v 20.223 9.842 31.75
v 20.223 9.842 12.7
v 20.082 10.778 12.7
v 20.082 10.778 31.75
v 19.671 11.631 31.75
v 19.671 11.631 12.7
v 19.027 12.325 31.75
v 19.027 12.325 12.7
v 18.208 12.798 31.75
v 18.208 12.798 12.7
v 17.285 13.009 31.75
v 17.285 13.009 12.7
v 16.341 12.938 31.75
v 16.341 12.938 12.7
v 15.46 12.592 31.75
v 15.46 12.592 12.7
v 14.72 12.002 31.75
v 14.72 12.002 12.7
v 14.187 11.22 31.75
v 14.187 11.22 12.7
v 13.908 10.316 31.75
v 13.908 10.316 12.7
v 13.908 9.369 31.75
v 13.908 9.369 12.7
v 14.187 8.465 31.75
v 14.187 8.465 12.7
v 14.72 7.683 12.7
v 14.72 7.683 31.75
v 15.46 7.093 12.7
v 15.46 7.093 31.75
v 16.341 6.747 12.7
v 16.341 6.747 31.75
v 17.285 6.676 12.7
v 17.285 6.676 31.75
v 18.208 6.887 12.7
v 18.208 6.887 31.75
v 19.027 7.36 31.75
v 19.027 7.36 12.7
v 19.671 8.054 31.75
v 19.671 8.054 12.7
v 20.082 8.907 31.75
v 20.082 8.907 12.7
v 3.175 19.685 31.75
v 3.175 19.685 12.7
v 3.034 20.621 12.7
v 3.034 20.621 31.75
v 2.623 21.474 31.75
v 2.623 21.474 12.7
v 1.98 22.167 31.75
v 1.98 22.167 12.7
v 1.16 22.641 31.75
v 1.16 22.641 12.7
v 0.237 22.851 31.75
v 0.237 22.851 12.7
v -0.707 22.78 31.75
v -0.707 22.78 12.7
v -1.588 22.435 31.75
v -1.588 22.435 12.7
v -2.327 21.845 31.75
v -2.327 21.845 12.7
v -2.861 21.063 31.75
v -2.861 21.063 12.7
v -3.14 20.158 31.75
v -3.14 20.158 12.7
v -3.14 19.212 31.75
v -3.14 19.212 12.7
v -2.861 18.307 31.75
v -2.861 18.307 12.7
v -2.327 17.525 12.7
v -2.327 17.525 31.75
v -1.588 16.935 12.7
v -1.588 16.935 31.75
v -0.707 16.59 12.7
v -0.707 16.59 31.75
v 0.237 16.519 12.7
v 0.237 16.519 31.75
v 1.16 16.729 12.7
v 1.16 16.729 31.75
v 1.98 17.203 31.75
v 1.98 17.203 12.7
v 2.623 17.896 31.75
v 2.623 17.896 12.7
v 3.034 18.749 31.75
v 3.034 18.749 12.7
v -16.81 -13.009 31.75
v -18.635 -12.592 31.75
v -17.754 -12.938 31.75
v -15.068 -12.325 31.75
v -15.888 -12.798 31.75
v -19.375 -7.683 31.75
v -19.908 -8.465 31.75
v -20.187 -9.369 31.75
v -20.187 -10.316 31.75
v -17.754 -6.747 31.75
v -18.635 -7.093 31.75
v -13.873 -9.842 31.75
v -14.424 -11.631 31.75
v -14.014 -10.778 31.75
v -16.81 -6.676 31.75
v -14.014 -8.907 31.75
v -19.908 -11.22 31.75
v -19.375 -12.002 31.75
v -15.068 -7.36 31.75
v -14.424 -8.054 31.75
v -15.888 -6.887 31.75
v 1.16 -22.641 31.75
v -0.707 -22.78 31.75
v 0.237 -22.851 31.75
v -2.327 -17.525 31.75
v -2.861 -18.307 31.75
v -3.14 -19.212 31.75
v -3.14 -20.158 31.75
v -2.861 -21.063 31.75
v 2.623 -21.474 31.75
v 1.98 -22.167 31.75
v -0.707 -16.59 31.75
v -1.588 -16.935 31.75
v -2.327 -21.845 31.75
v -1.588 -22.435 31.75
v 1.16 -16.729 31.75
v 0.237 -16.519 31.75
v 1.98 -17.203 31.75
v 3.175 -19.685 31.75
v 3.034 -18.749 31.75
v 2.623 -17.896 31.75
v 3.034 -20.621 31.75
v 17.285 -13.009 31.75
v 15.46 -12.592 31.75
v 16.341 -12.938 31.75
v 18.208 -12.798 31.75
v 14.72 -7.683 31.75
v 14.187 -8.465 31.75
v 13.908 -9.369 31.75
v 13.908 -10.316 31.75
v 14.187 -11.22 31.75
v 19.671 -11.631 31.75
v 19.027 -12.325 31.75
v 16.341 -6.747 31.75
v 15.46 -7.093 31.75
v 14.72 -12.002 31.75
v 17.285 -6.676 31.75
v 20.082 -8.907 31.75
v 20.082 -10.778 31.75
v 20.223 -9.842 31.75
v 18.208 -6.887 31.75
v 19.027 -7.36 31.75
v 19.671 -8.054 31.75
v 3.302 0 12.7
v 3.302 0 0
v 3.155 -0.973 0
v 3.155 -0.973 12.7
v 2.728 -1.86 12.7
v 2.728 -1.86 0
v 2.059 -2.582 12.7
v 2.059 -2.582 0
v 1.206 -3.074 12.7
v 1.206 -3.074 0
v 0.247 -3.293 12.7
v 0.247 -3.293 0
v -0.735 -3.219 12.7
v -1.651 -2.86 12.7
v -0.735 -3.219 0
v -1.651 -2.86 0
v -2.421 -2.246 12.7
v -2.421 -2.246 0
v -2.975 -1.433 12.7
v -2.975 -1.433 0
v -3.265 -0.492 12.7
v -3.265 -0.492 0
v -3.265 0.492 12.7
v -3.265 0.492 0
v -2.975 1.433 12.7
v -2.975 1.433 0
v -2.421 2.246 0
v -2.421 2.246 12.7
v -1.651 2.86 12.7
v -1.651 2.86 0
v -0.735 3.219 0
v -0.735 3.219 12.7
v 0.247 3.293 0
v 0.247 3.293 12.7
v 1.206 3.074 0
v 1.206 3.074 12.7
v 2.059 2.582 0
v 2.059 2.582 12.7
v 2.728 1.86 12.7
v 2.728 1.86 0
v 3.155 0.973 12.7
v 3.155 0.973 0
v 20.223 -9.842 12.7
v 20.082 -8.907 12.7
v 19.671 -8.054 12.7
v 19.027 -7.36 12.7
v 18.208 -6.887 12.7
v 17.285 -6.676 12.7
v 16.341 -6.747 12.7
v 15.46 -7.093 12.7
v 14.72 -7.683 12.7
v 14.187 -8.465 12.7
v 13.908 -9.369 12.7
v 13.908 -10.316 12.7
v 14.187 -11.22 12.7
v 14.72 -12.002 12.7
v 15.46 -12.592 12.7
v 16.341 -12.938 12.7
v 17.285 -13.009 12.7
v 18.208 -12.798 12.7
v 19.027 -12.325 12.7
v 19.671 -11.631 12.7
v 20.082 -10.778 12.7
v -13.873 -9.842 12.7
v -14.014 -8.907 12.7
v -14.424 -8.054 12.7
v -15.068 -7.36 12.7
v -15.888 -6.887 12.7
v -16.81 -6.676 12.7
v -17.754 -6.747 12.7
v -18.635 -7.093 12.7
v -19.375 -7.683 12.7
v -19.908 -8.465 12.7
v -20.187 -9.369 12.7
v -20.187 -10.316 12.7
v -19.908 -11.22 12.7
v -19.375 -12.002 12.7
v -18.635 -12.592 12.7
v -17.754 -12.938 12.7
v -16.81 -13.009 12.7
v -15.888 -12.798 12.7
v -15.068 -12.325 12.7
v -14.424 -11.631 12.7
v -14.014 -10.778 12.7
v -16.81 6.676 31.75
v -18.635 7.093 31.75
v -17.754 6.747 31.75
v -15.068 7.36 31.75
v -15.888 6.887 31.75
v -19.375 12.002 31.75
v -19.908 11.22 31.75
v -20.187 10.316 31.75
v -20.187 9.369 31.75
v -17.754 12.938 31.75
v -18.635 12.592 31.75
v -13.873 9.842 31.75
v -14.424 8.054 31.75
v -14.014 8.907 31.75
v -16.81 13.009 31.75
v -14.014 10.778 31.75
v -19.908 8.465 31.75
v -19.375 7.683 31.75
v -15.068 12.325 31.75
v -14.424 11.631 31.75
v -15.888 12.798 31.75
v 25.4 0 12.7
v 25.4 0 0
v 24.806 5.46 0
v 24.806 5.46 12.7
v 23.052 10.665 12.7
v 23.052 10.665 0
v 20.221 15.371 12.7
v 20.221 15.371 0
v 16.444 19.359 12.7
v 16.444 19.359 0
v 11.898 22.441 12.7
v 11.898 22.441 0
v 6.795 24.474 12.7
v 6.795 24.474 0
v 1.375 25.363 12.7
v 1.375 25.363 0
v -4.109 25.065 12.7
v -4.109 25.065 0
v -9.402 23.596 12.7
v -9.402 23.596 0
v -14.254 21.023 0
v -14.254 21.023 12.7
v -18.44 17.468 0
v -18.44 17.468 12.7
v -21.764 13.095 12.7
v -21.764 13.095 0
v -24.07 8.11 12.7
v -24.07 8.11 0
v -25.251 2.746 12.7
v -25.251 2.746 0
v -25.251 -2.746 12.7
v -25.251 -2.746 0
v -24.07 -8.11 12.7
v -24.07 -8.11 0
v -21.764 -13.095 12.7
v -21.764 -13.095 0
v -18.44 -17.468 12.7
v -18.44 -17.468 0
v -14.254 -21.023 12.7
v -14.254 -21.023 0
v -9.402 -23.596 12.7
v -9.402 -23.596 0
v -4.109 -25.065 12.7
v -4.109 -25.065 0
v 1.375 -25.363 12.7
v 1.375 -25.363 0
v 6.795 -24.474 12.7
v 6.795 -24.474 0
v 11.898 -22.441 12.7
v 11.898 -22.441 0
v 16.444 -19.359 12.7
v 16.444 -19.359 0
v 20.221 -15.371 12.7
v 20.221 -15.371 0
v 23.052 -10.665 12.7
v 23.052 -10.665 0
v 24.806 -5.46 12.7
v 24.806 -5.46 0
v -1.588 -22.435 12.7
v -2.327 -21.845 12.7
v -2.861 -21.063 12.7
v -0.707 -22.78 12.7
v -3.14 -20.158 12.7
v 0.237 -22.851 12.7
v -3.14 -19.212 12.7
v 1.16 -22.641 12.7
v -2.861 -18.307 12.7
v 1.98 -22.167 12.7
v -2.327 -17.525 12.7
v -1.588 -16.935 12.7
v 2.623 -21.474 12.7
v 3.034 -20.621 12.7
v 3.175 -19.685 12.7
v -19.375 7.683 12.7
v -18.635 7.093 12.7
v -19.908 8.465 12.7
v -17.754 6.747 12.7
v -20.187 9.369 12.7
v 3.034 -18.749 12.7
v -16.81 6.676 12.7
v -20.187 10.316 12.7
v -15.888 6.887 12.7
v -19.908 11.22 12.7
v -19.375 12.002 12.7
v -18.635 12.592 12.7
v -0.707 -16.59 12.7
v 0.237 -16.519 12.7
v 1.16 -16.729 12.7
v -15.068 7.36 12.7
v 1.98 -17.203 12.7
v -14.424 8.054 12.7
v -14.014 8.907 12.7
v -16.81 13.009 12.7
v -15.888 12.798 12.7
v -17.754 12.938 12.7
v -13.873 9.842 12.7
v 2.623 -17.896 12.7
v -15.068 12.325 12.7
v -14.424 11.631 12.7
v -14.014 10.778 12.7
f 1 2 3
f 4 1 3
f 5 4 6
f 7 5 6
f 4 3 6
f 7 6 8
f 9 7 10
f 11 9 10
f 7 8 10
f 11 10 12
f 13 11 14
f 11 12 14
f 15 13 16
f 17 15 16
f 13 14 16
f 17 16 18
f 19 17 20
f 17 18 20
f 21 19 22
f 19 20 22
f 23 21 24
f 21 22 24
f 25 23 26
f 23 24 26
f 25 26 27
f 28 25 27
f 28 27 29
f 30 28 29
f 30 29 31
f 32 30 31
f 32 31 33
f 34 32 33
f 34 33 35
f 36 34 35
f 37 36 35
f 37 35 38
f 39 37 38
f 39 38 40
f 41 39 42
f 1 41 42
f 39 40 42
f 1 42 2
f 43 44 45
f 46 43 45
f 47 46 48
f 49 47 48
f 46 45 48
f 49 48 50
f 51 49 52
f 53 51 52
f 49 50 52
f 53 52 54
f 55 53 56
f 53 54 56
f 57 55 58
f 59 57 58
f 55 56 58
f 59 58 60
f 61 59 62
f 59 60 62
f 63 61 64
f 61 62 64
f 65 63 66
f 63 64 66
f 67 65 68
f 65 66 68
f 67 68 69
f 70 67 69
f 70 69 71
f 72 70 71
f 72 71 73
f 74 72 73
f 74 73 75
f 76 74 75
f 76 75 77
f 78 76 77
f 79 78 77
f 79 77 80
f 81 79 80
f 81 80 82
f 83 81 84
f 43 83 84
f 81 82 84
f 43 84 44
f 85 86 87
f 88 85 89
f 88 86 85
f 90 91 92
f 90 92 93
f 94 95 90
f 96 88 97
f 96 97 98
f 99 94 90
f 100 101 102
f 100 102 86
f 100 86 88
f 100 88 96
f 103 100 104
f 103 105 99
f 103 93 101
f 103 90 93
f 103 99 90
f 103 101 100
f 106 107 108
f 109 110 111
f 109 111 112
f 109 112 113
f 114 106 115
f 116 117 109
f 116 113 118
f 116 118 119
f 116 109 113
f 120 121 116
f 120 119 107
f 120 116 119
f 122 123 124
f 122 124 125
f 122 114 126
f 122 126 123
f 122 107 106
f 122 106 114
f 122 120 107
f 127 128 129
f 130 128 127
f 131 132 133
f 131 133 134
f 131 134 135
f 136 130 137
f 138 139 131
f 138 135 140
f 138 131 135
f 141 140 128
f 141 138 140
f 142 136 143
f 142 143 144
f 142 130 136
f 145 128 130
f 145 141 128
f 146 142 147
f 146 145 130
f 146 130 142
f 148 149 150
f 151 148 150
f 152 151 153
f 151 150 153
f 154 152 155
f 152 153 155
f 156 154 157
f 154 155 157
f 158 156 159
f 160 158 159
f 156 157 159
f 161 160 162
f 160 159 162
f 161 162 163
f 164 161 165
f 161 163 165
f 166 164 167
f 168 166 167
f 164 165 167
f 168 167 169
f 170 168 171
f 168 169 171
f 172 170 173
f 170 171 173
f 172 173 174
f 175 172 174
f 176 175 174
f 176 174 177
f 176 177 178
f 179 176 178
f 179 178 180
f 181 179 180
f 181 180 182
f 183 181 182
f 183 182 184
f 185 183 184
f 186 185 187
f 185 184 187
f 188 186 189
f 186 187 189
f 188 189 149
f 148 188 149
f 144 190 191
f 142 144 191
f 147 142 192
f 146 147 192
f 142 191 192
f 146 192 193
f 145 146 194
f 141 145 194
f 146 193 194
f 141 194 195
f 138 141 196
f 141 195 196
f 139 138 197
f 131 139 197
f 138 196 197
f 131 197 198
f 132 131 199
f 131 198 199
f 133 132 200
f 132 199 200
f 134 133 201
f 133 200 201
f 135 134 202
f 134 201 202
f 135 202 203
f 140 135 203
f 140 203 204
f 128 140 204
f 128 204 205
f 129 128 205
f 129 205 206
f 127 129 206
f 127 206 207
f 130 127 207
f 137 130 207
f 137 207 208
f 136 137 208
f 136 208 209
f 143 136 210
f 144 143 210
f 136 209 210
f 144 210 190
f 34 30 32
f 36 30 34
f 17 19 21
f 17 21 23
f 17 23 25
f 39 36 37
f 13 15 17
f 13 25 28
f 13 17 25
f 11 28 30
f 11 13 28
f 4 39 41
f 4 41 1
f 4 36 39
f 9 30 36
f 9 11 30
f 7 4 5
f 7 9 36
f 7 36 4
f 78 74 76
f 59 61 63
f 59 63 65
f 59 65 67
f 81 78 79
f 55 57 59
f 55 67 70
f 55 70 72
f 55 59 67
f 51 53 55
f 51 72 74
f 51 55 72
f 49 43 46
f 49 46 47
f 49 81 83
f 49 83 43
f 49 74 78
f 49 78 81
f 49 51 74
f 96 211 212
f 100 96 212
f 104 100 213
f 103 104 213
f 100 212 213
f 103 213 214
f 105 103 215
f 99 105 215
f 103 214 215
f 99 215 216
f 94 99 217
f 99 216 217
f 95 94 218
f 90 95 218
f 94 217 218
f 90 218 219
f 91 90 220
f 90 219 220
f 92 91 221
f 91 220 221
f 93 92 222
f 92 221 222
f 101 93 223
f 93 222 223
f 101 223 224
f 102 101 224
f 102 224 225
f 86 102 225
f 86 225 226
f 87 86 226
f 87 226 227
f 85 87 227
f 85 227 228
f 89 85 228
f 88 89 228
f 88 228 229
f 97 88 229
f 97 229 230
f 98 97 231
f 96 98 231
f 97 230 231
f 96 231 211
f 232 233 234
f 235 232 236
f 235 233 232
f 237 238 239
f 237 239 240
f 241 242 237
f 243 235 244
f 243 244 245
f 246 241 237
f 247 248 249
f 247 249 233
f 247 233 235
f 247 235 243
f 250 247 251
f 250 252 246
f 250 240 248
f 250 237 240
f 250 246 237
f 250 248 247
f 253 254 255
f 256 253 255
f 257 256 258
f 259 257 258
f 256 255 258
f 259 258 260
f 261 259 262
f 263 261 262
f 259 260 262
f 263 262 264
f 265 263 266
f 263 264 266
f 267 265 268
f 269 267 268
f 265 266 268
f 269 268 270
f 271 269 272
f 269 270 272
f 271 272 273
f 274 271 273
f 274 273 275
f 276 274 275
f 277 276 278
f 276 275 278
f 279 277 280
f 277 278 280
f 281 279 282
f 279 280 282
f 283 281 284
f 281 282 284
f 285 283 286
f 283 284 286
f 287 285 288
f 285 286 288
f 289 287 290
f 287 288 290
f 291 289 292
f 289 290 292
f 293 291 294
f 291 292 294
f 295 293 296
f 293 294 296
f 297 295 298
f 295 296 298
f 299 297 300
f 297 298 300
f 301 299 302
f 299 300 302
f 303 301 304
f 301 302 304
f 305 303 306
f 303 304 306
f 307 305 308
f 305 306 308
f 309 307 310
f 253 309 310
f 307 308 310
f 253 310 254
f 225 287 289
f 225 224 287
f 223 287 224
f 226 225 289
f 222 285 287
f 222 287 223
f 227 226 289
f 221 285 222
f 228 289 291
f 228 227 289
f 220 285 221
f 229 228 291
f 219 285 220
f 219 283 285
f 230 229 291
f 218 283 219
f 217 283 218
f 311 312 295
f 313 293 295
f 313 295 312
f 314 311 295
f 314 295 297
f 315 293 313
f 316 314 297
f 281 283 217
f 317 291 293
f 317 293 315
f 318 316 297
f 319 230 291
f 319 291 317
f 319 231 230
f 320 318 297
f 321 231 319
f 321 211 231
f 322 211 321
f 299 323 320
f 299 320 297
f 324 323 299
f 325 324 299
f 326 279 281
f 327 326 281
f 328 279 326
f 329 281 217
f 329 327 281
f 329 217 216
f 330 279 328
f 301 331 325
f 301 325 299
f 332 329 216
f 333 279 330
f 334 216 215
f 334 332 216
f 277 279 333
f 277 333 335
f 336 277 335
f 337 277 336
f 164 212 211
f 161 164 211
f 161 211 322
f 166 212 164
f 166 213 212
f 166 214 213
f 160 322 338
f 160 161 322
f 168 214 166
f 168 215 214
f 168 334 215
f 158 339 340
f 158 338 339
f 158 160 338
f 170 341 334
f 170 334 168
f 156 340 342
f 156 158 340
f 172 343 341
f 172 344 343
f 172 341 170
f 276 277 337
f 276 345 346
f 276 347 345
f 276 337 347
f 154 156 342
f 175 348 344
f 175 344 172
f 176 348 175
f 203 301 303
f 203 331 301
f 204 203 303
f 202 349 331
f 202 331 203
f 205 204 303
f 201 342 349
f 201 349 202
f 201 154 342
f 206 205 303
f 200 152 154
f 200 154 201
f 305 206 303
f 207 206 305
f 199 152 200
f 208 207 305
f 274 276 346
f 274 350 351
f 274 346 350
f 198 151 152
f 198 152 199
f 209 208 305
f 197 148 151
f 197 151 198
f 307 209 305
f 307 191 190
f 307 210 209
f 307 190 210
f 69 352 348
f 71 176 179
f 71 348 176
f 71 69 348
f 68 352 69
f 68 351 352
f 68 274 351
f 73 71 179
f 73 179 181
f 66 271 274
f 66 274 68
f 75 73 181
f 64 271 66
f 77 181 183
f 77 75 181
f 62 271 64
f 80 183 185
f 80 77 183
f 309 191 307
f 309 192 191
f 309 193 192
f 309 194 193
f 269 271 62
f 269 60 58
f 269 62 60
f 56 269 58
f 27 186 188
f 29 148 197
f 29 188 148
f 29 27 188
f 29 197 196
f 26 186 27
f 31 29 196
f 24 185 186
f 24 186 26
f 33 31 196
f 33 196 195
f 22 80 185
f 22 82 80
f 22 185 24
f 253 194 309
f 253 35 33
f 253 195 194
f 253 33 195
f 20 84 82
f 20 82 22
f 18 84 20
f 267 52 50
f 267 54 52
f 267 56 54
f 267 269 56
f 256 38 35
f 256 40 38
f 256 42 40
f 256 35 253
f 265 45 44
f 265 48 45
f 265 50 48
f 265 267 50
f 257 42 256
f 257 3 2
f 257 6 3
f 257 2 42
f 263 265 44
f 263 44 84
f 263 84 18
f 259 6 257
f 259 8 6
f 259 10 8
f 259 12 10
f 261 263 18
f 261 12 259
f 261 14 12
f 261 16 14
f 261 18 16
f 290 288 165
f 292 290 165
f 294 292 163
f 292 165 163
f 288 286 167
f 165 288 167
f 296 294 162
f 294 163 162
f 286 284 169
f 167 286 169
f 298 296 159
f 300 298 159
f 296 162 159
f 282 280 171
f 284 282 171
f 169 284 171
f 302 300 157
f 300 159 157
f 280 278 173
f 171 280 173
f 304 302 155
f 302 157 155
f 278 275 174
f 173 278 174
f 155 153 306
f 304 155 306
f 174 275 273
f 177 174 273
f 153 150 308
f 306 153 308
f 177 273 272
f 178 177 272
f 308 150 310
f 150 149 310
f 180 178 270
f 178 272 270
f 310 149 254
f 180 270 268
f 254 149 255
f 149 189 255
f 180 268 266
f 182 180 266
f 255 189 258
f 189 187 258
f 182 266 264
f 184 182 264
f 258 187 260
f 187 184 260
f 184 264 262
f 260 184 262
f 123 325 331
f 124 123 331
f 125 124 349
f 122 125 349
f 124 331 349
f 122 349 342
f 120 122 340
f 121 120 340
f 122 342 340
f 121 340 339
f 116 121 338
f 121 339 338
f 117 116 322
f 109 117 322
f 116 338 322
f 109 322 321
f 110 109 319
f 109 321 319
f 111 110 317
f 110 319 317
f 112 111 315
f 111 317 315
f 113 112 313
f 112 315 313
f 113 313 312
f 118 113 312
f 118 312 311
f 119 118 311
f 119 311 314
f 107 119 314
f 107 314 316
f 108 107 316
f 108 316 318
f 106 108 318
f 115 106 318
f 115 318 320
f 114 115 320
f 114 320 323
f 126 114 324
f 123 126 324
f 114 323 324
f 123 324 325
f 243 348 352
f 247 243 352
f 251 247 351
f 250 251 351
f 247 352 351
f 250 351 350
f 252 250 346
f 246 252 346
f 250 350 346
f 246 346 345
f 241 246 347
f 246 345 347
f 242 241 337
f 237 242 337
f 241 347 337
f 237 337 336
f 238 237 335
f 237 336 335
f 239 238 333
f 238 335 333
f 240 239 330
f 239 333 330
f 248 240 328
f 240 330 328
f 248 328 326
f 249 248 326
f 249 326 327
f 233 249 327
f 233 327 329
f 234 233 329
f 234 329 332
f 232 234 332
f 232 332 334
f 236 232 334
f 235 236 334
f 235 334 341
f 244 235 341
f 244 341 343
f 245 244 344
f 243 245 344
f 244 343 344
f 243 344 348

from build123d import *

# Parameters (mm, degrees)
F0_R     = 25.4
F1_DEPTH = 12.7
F2_R     = 3.302
F3_DEPTH = 12.7
F4_R     = 3.175
F5_DEPTH = 19.05


# Not quite as in the source:
# - a feature names something its author has since deleted; it is built from what else it names


with BuildPart() as f1:
    # F0 (on Top) → F1 (new body)
    with BuildSketch(Plane.XY):
        Circle(F0_R)
    extrude(amount=F1_DEPTH)

    # F2 (on face) → F3 (cut)
    with BuildSketch(Plane(origin=(0, 0, 0), x_dir=(1, 0, 0), z_dir=(0, 0, -1))):
        Circle(F2_R)
    extrude(amount=-F3_DEPTH, mode=Mode.SUBTRACT)

    # F4 (on face) → F5 (join)
    with BuildSketch(Plane.XY.offset(12.7)):
        with Locations((0, 19.685)):
            Circle(F4_R)
        with Locations((-17.0477100735, 9.8425)):
            Circle(F4_R)
        with Locations((-17.0477100735, -9.8425)):
            Circle(F4_R)
        with Locations((0, -19.685)):
            Circle(F4_R)
        with Locations((17.0477100735, -9.8425)):
            Circle(F4_R)
        with Locations((17.0477100735, 9.8425)):
            Circle(F4_R)
    extrude(amount=F5_DEPTH)


solid = f1.part
